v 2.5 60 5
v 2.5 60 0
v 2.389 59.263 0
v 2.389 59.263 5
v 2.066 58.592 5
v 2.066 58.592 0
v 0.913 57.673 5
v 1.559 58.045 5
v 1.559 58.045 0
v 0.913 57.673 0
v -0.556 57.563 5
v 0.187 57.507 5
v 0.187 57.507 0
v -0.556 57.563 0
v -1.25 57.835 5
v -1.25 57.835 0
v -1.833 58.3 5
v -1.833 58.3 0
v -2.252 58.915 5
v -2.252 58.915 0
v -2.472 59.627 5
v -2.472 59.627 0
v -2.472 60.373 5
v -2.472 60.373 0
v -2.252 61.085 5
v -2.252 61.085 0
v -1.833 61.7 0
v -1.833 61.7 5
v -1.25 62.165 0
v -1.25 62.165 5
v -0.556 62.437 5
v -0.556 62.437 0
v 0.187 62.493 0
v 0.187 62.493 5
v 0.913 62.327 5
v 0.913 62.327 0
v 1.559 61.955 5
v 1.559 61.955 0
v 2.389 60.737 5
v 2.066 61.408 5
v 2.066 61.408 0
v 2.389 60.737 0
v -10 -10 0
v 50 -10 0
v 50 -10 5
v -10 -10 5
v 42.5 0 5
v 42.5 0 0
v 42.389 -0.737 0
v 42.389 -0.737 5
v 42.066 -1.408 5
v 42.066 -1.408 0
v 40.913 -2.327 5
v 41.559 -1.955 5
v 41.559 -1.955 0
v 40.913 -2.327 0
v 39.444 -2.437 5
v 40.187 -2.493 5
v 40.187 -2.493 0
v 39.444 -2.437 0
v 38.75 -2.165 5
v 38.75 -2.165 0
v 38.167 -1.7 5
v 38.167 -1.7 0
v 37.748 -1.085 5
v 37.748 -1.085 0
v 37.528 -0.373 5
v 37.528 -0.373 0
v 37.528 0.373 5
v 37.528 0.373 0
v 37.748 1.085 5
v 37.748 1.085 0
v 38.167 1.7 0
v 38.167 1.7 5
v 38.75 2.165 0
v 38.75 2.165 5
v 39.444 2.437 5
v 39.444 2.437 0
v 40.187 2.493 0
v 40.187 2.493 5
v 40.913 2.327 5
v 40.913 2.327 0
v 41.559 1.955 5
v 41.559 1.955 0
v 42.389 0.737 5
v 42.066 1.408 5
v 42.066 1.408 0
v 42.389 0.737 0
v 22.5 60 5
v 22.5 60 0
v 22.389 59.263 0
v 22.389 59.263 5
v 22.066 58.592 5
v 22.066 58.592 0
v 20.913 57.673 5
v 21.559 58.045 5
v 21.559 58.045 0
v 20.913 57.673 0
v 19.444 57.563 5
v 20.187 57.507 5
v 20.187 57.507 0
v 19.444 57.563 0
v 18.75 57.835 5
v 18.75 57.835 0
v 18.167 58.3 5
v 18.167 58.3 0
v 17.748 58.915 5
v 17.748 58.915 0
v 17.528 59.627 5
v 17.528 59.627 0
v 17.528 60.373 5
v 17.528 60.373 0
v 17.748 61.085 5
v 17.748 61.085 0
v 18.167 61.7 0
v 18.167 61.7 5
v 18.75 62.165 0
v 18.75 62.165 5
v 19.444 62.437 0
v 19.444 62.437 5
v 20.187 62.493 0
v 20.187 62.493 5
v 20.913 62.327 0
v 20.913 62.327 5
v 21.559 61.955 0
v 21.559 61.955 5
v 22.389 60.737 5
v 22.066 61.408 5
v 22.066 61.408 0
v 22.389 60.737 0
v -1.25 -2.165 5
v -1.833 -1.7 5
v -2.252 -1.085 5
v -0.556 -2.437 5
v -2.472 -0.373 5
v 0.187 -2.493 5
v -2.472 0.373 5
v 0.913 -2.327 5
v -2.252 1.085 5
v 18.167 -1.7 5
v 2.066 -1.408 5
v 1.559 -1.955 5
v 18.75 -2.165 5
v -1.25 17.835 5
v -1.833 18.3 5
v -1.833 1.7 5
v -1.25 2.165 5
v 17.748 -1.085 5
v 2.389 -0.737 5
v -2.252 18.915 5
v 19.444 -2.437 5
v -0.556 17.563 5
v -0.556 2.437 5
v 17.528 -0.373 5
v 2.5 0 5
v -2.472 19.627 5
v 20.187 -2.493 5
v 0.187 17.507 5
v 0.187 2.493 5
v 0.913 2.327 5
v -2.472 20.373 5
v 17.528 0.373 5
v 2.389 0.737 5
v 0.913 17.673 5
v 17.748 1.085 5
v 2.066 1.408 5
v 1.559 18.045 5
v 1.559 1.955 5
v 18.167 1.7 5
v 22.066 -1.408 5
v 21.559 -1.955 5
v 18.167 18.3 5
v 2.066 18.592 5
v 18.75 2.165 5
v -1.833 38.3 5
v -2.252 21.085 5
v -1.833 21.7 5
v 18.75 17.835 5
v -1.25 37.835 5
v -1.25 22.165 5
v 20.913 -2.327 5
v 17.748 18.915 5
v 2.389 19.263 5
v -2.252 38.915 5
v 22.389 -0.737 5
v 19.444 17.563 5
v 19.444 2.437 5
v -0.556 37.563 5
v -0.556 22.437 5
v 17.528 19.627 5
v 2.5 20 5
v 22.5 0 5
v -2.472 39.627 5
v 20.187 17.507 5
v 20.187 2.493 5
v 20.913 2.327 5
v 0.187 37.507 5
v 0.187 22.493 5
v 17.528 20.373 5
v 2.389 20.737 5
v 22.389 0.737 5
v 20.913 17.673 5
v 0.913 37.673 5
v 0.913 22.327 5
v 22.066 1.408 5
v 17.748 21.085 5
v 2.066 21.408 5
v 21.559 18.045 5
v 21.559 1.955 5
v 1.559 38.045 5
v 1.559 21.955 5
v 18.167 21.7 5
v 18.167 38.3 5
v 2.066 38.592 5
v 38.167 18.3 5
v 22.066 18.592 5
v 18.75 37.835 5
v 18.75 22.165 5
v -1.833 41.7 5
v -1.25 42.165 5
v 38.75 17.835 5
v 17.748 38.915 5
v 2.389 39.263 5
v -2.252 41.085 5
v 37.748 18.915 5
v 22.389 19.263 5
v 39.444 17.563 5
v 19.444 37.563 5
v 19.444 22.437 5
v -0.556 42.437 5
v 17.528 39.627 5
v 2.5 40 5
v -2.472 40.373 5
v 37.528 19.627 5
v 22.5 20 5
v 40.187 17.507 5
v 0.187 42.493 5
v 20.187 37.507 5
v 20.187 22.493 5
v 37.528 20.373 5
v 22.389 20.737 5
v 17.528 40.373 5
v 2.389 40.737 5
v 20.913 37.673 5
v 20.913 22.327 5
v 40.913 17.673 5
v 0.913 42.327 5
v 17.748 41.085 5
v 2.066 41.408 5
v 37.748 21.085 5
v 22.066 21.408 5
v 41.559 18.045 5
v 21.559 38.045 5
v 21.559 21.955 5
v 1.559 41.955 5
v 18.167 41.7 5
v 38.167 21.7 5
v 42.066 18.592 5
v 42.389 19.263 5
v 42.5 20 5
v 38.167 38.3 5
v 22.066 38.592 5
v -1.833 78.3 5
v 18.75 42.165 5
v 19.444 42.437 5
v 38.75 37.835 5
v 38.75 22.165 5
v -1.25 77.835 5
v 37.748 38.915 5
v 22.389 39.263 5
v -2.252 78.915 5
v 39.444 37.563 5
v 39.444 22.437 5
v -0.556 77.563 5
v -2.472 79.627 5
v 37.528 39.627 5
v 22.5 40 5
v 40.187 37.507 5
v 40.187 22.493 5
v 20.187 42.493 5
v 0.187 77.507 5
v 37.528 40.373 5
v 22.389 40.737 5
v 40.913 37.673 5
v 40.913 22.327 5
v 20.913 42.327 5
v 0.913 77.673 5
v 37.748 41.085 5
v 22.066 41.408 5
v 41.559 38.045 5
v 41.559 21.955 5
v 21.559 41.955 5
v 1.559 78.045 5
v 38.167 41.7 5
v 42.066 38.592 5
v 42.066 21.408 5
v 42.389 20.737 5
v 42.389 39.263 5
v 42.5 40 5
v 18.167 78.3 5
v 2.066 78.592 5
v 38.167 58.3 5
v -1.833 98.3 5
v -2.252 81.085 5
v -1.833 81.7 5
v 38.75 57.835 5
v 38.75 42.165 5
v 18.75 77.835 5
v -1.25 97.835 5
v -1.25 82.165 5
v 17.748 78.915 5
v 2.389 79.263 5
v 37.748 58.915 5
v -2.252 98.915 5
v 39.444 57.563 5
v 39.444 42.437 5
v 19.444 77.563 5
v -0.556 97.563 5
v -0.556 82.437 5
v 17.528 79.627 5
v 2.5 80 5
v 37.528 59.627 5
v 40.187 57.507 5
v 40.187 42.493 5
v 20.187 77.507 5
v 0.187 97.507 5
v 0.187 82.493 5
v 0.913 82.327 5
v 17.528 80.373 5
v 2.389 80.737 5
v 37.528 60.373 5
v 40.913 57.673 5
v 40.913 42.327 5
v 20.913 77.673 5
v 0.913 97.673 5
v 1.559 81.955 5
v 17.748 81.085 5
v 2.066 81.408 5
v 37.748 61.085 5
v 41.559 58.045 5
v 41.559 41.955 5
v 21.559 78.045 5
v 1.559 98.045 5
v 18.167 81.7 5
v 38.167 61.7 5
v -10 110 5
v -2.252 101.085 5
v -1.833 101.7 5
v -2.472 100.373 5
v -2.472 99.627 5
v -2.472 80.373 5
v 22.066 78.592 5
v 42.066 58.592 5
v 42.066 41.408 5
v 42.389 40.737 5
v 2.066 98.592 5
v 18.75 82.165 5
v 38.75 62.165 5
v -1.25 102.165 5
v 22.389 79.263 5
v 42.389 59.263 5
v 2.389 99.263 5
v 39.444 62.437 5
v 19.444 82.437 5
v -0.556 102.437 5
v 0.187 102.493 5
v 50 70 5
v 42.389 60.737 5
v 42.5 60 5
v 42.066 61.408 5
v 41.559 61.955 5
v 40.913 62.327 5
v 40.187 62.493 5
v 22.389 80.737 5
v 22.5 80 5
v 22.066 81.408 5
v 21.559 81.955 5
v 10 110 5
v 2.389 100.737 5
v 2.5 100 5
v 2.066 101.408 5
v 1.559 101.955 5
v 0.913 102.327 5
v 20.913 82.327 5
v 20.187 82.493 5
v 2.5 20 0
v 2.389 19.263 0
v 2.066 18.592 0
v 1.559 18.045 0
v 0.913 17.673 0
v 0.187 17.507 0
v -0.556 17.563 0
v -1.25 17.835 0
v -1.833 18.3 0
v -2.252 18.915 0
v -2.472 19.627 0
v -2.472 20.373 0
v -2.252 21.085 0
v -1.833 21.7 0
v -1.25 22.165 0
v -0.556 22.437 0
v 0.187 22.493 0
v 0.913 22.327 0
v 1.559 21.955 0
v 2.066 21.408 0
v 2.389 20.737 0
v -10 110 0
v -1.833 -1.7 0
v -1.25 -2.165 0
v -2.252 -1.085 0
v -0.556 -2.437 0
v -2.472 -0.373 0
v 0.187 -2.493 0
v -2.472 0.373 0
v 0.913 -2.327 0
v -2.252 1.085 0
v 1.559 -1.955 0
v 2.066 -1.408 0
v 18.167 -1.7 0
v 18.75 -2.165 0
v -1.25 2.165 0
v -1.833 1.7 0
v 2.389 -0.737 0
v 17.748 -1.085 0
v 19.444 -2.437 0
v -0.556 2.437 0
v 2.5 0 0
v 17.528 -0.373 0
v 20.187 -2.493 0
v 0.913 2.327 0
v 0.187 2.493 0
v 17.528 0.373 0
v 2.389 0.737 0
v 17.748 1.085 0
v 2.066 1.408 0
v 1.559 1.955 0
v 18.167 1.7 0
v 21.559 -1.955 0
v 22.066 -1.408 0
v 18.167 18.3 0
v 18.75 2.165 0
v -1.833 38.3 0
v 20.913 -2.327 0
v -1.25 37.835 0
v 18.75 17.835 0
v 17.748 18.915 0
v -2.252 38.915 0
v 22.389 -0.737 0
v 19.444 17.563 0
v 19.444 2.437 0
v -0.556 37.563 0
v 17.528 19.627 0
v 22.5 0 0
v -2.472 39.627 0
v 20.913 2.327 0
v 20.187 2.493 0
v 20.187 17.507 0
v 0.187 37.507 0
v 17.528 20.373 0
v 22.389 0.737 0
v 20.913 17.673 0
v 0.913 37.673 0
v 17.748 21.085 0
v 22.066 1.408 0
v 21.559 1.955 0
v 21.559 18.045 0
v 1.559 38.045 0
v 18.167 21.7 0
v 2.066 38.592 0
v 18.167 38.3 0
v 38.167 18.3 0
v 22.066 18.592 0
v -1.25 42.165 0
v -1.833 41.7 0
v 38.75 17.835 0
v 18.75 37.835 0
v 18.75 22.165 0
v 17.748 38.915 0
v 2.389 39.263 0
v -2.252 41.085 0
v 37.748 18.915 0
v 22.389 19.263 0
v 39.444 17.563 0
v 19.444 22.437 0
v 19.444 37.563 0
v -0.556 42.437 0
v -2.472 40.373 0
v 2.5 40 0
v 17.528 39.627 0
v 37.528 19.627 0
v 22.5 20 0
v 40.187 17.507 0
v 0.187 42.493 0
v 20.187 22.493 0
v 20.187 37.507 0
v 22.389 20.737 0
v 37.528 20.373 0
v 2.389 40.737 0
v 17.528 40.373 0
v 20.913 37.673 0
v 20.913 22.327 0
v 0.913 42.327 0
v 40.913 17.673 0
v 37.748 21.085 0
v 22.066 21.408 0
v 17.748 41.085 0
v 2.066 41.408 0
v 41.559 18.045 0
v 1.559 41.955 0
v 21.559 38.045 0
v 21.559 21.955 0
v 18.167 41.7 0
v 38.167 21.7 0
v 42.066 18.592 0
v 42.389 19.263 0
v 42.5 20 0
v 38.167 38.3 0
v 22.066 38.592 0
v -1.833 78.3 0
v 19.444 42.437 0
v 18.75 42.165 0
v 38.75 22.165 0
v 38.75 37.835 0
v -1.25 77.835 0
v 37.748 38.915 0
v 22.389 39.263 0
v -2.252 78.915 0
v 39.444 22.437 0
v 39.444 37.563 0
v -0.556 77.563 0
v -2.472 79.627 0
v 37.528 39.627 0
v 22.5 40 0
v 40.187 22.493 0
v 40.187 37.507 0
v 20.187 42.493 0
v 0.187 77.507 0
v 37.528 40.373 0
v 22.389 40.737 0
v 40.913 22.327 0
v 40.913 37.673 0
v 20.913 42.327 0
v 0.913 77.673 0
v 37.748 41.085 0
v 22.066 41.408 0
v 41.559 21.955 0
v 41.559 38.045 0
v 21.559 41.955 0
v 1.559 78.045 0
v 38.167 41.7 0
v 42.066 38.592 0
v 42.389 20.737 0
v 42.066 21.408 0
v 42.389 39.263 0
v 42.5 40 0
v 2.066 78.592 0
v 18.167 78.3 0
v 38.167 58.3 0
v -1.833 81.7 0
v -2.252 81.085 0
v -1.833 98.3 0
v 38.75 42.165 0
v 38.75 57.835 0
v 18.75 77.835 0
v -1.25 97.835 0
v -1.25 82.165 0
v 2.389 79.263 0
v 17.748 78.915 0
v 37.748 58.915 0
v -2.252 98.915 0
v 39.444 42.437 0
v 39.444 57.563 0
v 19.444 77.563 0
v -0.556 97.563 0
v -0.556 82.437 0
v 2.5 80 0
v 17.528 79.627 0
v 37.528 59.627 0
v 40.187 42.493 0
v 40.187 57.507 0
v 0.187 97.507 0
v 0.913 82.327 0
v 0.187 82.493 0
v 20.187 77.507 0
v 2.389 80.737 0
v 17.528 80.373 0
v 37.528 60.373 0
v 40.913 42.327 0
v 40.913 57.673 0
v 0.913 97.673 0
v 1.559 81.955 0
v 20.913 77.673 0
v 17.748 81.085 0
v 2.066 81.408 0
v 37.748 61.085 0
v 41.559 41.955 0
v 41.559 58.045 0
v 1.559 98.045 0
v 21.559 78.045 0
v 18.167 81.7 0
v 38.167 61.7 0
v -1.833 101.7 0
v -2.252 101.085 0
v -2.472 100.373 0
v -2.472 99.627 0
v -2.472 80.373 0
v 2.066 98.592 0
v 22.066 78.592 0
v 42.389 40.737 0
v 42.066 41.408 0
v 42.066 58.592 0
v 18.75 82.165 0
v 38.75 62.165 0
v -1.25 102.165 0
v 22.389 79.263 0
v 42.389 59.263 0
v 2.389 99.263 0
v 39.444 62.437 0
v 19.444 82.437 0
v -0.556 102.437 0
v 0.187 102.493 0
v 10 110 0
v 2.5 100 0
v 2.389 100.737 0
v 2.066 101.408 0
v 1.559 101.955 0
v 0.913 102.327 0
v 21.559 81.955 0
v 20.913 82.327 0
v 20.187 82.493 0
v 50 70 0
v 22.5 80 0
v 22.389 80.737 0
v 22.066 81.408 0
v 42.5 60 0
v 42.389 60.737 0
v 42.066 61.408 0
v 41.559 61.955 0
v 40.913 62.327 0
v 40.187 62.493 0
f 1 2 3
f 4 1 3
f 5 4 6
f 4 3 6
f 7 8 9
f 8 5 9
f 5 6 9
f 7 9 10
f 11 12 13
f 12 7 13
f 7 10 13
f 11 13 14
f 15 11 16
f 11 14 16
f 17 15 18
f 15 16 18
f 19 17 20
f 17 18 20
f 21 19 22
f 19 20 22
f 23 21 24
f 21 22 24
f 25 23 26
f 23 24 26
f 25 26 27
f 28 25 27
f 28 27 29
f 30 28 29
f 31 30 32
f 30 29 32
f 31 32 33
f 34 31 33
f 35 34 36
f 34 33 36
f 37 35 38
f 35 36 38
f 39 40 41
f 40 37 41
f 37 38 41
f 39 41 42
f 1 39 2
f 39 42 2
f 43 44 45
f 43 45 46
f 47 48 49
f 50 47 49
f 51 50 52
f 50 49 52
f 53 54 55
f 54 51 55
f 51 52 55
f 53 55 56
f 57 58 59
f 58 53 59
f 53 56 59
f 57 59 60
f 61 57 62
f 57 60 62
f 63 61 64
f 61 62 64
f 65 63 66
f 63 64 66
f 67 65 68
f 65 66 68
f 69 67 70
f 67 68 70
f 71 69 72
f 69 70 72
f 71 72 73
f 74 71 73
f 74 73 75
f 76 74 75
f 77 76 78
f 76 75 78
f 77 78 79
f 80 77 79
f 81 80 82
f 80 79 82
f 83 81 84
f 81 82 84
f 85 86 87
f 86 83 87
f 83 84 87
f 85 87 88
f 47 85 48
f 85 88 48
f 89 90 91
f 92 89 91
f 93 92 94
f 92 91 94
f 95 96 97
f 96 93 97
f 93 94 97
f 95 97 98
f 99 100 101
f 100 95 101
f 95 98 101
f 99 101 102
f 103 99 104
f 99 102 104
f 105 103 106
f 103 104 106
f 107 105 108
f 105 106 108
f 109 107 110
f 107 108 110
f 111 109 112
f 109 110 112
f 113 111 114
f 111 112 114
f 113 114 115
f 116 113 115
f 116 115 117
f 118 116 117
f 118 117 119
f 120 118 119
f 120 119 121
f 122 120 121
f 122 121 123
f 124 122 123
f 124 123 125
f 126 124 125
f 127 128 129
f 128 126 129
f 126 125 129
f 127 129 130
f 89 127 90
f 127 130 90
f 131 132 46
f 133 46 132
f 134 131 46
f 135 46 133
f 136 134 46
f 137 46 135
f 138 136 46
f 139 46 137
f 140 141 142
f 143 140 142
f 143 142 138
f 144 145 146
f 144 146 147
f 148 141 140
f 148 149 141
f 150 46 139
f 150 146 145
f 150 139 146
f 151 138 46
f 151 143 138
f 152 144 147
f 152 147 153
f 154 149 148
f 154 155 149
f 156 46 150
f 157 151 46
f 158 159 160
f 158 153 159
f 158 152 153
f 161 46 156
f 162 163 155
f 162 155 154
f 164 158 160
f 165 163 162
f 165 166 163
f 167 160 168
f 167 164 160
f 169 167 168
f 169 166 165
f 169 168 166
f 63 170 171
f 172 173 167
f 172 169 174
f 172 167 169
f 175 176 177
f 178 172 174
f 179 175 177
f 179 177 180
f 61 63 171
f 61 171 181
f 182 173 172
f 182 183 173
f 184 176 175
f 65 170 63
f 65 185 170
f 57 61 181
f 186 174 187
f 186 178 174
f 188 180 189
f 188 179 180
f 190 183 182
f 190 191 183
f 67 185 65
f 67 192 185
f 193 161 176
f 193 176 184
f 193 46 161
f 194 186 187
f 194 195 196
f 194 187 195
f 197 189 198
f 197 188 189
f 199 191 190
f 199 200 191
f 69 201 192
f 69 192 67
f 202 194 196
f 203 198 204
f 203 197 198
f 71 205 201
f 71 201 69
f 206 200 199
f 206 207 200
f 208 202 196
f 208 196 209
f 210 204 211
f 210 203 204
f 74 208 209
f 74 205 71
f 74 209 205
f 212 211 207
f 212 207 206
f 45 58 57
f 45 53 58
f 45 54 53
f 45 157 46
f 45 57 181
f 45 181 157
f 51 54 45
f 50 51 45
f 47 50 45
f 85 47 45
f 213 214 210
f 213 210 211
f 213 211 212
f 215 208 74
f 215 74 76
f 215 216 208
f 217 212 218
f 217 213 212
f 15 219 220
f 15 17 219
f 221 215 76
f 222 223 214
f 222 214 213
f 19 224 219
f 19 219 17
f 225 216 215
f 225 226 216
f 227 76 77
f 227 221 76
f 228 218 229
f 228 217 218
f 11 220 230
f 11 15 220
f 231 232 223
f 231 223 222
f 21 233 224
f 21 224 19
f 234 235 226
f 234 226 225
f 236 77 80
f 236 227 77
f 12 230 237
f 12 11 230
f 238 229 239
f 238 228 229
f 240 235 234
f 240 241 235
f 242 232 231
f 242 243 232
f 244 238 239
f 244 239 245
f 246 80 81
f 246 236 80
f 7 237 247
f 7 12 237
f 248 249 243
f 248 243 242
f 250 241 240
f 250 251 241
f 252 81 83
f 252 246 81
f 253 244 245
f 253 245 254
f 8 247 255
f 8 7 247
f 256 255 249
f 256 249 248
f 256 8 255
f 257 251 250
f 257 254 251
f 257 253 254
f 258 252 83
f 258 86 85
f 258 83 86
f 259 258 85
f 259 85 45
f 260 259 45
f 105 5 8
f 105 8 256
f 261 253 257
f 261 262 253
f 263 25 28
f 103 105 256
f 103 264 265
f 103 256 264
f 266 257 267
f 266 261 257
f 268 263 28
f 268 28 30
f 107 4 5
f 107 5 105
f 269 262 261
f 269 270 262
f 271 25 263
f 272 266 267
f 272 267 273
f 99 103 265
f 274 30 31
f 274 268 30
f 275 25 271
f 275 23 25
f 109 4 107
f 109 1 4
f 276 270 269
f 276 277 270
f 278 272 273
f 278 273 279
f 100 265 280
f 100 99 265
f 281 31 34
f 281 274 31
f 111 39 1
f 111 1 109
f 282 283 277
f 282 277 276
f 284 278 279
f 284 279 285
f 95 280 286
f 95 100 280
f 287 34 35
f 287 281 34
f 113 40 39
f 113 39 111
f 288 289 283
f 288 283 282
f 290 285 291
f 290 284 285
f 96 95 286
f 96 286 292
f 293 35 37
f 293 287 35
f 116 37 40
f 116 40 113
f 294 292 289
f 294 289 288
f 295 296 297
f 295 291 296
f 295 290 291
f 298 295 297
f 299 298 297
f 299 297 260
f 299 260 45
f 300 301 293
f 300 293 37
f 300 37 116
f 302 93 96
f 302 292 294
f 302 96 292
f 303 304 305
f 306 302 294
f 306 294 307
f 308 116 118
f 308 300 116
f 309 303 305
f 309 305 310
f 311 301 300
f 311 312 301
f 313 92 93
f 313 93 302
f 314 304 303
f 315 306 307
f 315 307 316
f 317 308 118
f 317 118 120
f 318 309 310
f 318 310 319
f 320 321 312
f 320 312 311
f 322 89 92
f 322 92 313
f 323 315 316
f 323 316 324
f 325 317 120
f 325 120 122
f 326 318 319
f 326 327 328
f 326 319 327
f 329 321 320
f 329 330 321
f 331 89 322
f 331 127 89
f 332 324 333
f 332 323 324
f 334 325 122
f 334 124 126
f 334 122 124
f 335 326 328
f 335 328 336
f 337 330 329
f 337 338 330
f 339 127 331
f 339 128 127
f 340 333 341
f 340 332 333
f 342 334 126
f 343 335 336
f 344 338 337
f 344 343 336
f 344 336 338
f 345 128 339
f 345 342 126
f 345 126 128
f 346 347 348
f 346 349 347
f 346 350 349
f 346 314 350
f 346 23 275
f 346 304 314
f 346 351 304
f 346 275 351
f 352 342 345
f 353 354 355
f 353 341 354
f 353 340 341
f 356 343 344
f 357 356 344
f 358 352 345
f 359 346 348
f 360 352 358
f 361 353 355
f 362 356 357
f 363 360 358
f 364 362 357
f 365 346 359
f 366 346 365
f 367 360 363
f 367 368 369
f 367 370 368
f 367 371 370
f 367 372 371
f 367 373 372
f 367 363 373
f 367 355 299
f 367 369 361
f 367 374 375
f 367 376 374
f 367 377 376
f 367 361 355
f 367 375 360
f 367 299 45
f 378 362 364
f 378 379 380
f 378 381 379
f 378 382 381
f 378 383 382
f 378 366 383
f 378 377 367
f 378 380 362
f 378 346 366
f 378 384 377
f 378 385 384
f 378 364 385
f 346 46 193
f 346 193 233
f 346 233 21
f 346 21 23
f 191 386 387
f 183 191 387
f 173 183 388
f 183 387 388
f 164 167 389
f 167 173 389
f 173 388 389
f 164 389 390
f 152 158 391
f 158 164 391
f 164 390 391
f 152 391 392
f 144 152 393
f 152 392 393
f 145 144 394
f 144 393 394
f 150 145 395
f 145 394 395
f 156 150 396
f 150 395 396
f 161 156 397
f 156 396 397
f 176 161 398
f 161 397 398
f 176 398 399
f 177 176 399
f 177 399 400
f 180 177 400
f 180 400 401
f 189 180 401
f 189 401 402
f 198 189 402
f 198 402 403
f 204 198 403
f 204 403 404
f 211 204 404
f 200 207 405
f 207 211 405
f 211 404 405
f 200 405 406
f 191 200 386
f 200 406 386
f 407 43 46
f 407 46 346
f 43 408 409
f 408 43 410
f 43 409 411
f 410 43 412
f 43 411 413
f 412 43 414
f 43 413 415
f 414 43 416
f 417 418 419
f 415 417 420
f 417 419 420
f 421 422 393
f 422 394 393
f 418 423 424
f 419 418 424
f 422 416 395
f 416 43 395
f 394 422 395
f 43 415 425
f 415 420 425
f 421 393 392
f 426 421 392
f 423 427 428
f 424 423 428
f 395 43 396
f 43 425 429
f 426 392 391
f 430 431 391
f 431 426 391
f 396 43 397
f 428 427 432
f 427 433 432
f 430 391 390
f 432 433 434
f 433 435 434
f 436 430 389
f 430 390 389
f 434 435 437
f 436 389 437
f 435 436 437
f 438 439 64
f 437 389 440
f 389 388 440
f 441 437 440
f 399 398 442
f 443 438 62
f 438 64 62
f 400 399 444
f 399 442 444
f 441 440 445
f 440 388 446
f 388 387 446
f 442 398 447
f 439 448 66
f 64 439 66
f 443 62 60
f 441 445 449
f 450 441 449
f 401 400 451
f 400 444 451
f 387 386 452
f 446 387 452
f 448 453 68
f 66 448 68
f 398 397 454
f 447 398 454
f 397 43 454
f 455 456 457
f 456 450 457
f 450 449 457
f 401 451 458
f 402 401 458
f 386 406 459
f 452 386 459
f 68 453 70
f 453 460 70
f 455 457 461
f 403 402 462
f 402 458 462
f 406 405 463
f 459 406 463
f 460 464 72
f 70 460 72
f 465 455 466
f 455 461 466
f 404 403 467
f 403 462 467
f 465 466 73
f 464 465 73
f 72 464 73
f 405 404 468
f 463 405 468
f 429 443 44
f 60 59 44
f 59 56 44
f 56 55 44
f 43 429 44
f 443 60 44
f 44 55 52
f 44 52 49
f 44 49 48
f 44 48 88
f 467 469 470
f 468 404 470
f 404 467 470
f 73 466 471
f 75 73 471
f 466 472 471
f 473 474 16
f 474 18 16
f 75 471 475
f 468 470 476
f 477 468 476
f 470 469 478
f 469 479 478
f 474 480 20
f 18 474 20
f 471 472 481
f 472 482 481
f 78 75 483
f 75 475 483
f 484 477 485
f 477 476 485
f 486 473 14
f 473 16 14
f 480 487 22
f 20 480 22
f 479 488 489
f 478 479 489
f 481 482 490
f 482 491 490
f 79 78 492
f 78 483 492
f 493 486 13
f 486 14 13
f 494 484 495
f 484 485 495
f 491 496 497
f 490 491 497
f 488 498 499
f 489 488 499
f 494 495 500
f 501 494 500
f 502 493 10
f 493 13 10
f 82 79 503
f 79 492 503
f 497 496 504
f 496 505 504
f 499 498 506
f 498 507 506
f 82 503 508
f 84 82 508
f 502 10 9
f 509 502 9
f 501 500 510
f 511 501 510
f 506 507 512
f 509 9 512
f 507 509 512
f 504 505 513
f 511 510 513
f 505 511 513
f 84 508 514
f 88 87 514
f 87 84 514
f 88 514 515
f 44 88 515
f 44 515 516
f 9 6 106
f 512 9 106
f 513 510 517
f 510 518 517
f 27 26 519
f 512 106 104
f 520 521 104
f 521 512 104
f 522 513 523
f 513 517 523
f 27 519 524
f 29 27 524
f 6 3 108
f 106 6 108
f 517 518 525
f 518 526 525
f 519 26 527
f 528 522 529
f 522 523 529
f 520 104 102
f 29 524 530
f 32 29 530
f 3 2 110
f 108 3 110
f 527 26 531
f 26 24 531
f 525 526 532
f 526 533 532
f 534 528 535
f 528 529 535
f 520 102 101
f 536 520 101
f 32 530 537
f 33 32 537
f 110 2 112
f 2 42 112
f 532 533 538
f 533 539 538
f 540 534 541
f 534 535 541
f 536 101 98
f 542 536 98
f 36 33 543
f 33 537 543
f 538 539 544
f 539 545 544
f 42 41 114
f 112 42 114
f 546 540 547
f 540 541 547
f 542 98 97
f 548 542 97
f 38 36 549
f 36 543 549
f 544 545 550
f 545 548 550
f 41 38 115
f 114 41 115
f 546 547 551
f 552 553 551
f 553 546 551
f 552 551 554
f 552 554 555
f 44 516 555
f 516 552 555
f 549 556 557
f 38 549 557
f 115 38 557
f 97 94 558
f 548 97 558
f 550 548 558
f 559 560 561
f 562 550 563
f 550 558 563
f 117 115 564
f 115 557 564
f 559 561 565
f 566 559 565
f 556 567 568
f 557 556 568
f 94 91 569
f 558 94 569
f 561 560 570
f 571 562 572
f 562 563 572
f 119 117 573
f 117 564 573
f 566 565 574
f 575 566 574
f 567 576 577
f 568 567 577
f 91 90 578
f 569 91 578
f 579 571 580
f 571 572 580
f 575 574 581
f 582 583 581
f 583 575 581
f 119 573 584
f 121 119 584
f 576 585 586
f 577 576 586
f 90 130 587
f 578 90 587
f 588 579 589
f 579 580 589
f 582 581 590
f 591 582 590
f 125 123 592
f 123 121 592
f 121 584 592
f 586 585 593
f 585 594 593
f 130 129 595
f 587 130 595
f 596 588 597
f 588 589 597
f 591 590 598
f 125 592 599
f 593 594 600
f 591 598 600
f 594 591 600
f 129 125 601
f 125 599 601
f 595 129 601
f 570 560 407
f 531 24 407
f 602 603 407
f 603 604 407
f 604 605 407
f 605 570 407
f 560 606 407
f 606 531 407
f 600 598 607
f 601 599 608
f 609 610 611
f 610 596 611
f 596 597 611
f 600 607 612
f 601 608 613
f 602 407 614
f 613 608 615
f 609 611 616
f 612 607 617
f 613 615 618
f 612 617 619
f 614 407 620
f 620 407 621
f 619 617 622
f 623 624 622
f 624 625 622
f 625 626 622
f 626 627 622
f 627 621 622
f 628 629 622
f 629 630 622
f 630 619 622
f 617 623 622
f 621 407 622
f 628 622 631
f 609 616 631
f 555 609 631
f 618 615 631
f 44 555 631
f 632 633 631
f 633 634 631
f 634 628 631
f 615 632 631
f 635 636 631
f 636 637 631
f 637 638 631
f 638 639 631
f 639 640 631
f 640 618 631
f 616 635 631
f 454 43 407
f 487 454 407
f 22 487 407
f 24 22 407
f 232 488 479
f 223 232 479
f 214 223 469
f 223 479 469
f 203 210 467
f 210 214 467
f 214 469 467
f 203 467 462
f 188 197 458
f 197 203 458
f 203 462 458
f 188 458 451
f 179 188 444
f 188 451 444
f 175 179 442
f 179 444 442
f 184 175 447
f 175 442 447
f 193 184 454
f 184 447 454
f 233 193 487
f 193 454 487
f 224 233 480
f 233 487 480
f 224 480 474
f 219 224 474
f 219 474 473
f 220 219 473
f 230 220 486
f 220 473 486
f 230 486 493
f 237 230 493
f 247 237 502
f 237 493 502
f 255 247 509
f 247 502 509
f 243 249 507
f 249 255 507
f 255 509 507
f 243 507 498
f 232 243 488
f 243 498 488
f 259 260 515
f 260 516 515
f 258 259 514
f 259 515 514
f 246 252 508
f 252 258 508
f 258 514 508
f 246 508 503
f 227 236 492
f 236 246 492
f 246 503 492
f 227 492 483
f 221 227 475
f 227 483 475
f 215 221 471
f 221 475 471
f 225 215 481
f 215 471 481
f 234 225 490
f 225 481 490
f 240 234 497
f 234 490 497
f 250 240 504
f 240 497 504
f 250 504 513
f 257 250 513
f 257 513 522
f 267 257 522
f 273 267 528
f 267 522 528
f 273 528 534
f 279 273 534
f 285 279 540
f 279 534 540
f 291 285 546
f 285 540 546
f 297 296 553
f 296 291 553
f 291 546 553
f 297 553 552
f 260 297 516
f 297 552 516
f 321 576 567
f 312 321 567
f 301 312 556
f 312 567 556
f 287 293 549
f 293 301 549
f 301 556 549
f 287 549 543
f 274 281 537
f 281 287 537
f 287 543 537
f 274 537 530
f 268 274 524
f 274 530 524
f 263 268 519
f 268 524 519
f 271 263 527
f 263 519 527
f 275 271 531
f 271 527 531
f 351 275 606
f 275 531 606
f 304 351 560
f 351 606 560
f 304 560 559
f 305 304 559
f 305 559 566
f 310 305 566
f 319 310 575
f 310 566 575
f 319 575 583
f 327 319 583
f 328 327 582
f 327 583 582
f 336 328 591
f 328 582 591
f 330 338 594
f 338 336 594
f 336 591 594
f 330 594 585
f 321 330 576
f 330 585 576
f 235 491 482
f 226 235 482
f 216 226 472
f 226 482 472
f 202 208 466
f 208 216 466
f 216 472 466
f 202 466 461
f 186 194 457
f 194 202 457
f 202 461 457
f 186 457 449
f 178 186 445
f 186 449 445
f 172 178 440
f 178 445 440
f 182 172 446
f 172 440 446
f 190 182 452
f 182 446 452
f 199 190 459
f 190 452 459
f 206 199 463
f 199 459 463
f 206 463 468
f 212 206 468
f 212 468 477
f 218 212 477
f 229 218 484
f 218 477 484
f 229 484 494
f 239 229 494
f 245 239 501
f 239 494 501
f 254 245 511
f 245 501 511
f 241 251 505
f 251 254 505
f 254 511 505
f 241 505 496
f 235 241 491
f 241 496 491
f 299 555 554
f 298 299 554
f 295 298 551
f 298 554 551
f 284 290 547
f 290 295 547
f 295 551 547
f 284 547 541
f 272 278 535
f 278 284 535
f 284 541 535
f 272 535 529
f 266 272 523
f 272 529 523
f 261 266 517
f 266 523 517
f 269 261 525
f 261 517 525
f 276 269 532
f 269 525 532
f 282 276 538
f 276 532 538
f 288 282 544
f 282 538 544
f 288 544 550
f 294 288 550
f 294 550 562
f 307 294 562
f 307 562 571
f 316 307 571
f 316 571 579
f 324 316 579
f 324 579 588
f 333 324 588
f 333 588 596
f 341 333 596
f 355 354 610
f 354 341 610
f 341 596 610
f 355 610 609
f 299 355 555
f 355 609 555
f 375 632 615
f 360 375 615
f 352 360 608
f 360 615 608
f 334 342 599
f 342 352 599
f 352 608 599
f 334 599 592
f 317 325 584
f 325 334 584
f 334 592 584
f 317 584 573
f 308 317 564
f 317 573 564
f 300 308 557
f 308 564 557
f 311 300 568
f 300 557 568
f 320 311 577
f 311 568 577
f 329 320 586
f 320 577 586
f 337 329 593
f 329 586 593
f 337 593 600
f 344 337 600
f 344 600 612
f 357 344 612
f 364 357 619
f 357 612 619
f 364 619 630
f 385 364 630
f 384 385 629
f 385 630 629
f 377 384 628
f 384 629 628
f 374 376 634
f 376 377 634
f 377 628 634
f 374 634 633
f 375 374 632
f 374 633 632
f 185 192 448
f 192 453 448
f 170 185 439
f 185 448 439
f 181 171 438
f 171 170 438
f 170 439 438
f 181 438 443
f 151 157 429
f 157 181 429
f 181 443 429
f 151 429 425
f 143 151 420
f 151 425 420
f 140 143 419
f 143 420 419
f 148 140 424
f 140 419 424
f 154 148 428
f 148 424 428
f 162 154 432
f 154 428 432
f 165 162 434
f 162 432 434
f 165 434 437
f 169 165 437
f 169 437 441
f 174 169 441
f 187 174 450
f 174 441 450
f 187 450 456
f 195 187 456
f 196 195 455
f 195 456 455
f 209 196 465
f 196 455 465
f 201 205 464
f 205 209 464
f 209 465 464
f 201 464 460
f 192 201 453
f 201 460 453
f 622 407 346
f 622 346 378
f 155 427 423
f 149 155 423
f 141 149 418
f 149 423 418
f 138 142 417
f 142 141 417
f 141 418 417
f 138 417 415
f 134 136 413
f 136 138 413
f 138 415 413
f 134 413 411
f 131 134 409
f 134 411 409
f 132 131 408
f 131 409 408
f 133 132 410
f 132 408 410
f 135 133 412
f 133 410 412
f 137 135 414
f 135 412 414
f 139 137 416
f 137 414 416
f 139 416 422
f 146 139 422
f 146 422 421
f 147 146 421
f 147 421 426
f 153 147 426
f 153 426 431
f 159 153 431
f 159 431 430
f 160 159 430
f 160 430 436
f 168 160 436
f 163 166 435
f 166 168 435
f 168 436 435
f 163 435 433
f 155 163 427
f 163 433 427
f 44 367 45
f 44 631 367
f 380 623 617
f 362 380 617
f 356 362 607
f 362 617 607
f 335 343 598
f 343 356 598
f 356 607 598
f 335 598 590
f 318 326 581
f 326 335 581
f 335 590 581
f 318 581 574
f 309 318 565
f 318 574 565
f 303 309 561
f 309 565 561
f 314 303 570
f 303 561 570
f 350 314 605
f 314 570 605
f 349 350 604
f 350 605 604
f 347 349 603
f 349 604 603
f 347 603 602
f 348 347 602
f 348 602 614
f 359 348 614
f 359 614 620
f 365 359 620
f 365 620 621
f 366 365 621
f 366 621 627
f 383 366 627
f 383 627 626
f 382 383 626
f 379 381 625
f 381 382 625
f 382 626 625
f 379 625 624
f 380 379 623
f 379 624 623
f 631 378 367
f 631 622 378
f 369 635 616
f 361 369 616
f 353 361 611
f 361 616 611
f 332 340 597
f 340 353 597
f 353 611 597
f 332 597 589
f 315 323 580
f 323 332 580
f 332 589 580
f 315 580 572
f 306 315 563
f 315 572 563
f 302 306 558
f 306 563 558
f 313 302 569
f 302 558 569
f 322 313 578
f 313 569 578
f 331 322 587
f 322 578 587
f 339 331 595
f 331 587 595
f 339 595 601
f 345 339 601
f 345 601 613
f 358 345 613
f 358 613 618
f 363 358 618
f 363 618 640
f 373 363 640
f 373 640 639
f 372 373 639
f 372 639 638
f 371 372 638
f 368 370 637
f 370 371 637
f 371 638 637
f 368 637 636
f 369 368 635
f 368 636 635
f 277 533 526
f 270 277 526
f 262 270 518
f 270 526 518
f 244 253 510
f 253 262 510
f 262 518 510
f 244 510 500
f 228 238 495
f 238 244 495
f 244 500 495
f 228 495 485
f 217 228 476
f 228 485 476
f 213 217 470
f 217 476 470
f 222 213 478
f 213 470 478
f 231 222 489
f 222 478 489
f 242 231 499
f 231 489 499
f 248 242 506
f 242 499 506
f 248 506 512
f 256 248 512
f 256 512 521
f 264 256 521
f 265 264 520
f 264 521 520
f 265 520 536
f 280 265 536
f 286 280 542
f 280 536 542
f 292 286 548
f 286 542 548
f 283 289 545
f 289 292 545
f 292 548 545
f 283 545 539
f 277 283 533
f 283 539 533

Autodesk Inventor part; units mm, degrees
ref_plane "YZ Plane" through (0, 0, 0) normal (1, 0, 0) x (0, 1, 0)
ref_plane "XZ Plane" through (0, 0, 0) normal (0, 1, 0) x (-1, 0, 0)
ref_plane "XY Plane" through (0, 0, 0) normal (0, 0, 1) x (1, 0, 0)
sketch "Sketch2" plane through (0, 0, 0) normal (0, 0, 1) x (1, 0, 0)
  line L0 (-10, -10) -> (-10, 110)
  line L1 (-10, 110) -> (10, 110)
  line L2 (10, 110) -> (50, 70)
  line L3 (50, 70) -> (50, -10)
  line L4 (50, -10) -> (-10, -10)
  circle A0 centre (40, 0) radius 2.5
  circle A1 centre (40, 20) radius 2.5
  circle A2 centre (40, 40) radius 2.5
  circle A3 centre (40, 60) radius 2.5
  circle A4 centre (20, 80) radius 2.5
  circle A5 centre (20, 60) radius 2.5
  circle A6 centre (20, 40) radius 2.5
  circle A7 centre (20, 20) radius 2.5
  circle A8 centre (20, 0) radius 2.5
  circle A9 centre (0, 0) radius 2.5
  circle A10 centre (0, 20) radius 2.5
  circle A11 centre (0, 40) radius 2.5
  circle A12 centre (0, 60) radius 2.5
  circle A13 centre (0, 80) radius 2.5
  circle A14 centre (0, 100) radius 2.5
extrude "Extrusion1" add sketch "Sketch2" along normal blind 5
properties part number "MAKERSLIDE_RISERS"
